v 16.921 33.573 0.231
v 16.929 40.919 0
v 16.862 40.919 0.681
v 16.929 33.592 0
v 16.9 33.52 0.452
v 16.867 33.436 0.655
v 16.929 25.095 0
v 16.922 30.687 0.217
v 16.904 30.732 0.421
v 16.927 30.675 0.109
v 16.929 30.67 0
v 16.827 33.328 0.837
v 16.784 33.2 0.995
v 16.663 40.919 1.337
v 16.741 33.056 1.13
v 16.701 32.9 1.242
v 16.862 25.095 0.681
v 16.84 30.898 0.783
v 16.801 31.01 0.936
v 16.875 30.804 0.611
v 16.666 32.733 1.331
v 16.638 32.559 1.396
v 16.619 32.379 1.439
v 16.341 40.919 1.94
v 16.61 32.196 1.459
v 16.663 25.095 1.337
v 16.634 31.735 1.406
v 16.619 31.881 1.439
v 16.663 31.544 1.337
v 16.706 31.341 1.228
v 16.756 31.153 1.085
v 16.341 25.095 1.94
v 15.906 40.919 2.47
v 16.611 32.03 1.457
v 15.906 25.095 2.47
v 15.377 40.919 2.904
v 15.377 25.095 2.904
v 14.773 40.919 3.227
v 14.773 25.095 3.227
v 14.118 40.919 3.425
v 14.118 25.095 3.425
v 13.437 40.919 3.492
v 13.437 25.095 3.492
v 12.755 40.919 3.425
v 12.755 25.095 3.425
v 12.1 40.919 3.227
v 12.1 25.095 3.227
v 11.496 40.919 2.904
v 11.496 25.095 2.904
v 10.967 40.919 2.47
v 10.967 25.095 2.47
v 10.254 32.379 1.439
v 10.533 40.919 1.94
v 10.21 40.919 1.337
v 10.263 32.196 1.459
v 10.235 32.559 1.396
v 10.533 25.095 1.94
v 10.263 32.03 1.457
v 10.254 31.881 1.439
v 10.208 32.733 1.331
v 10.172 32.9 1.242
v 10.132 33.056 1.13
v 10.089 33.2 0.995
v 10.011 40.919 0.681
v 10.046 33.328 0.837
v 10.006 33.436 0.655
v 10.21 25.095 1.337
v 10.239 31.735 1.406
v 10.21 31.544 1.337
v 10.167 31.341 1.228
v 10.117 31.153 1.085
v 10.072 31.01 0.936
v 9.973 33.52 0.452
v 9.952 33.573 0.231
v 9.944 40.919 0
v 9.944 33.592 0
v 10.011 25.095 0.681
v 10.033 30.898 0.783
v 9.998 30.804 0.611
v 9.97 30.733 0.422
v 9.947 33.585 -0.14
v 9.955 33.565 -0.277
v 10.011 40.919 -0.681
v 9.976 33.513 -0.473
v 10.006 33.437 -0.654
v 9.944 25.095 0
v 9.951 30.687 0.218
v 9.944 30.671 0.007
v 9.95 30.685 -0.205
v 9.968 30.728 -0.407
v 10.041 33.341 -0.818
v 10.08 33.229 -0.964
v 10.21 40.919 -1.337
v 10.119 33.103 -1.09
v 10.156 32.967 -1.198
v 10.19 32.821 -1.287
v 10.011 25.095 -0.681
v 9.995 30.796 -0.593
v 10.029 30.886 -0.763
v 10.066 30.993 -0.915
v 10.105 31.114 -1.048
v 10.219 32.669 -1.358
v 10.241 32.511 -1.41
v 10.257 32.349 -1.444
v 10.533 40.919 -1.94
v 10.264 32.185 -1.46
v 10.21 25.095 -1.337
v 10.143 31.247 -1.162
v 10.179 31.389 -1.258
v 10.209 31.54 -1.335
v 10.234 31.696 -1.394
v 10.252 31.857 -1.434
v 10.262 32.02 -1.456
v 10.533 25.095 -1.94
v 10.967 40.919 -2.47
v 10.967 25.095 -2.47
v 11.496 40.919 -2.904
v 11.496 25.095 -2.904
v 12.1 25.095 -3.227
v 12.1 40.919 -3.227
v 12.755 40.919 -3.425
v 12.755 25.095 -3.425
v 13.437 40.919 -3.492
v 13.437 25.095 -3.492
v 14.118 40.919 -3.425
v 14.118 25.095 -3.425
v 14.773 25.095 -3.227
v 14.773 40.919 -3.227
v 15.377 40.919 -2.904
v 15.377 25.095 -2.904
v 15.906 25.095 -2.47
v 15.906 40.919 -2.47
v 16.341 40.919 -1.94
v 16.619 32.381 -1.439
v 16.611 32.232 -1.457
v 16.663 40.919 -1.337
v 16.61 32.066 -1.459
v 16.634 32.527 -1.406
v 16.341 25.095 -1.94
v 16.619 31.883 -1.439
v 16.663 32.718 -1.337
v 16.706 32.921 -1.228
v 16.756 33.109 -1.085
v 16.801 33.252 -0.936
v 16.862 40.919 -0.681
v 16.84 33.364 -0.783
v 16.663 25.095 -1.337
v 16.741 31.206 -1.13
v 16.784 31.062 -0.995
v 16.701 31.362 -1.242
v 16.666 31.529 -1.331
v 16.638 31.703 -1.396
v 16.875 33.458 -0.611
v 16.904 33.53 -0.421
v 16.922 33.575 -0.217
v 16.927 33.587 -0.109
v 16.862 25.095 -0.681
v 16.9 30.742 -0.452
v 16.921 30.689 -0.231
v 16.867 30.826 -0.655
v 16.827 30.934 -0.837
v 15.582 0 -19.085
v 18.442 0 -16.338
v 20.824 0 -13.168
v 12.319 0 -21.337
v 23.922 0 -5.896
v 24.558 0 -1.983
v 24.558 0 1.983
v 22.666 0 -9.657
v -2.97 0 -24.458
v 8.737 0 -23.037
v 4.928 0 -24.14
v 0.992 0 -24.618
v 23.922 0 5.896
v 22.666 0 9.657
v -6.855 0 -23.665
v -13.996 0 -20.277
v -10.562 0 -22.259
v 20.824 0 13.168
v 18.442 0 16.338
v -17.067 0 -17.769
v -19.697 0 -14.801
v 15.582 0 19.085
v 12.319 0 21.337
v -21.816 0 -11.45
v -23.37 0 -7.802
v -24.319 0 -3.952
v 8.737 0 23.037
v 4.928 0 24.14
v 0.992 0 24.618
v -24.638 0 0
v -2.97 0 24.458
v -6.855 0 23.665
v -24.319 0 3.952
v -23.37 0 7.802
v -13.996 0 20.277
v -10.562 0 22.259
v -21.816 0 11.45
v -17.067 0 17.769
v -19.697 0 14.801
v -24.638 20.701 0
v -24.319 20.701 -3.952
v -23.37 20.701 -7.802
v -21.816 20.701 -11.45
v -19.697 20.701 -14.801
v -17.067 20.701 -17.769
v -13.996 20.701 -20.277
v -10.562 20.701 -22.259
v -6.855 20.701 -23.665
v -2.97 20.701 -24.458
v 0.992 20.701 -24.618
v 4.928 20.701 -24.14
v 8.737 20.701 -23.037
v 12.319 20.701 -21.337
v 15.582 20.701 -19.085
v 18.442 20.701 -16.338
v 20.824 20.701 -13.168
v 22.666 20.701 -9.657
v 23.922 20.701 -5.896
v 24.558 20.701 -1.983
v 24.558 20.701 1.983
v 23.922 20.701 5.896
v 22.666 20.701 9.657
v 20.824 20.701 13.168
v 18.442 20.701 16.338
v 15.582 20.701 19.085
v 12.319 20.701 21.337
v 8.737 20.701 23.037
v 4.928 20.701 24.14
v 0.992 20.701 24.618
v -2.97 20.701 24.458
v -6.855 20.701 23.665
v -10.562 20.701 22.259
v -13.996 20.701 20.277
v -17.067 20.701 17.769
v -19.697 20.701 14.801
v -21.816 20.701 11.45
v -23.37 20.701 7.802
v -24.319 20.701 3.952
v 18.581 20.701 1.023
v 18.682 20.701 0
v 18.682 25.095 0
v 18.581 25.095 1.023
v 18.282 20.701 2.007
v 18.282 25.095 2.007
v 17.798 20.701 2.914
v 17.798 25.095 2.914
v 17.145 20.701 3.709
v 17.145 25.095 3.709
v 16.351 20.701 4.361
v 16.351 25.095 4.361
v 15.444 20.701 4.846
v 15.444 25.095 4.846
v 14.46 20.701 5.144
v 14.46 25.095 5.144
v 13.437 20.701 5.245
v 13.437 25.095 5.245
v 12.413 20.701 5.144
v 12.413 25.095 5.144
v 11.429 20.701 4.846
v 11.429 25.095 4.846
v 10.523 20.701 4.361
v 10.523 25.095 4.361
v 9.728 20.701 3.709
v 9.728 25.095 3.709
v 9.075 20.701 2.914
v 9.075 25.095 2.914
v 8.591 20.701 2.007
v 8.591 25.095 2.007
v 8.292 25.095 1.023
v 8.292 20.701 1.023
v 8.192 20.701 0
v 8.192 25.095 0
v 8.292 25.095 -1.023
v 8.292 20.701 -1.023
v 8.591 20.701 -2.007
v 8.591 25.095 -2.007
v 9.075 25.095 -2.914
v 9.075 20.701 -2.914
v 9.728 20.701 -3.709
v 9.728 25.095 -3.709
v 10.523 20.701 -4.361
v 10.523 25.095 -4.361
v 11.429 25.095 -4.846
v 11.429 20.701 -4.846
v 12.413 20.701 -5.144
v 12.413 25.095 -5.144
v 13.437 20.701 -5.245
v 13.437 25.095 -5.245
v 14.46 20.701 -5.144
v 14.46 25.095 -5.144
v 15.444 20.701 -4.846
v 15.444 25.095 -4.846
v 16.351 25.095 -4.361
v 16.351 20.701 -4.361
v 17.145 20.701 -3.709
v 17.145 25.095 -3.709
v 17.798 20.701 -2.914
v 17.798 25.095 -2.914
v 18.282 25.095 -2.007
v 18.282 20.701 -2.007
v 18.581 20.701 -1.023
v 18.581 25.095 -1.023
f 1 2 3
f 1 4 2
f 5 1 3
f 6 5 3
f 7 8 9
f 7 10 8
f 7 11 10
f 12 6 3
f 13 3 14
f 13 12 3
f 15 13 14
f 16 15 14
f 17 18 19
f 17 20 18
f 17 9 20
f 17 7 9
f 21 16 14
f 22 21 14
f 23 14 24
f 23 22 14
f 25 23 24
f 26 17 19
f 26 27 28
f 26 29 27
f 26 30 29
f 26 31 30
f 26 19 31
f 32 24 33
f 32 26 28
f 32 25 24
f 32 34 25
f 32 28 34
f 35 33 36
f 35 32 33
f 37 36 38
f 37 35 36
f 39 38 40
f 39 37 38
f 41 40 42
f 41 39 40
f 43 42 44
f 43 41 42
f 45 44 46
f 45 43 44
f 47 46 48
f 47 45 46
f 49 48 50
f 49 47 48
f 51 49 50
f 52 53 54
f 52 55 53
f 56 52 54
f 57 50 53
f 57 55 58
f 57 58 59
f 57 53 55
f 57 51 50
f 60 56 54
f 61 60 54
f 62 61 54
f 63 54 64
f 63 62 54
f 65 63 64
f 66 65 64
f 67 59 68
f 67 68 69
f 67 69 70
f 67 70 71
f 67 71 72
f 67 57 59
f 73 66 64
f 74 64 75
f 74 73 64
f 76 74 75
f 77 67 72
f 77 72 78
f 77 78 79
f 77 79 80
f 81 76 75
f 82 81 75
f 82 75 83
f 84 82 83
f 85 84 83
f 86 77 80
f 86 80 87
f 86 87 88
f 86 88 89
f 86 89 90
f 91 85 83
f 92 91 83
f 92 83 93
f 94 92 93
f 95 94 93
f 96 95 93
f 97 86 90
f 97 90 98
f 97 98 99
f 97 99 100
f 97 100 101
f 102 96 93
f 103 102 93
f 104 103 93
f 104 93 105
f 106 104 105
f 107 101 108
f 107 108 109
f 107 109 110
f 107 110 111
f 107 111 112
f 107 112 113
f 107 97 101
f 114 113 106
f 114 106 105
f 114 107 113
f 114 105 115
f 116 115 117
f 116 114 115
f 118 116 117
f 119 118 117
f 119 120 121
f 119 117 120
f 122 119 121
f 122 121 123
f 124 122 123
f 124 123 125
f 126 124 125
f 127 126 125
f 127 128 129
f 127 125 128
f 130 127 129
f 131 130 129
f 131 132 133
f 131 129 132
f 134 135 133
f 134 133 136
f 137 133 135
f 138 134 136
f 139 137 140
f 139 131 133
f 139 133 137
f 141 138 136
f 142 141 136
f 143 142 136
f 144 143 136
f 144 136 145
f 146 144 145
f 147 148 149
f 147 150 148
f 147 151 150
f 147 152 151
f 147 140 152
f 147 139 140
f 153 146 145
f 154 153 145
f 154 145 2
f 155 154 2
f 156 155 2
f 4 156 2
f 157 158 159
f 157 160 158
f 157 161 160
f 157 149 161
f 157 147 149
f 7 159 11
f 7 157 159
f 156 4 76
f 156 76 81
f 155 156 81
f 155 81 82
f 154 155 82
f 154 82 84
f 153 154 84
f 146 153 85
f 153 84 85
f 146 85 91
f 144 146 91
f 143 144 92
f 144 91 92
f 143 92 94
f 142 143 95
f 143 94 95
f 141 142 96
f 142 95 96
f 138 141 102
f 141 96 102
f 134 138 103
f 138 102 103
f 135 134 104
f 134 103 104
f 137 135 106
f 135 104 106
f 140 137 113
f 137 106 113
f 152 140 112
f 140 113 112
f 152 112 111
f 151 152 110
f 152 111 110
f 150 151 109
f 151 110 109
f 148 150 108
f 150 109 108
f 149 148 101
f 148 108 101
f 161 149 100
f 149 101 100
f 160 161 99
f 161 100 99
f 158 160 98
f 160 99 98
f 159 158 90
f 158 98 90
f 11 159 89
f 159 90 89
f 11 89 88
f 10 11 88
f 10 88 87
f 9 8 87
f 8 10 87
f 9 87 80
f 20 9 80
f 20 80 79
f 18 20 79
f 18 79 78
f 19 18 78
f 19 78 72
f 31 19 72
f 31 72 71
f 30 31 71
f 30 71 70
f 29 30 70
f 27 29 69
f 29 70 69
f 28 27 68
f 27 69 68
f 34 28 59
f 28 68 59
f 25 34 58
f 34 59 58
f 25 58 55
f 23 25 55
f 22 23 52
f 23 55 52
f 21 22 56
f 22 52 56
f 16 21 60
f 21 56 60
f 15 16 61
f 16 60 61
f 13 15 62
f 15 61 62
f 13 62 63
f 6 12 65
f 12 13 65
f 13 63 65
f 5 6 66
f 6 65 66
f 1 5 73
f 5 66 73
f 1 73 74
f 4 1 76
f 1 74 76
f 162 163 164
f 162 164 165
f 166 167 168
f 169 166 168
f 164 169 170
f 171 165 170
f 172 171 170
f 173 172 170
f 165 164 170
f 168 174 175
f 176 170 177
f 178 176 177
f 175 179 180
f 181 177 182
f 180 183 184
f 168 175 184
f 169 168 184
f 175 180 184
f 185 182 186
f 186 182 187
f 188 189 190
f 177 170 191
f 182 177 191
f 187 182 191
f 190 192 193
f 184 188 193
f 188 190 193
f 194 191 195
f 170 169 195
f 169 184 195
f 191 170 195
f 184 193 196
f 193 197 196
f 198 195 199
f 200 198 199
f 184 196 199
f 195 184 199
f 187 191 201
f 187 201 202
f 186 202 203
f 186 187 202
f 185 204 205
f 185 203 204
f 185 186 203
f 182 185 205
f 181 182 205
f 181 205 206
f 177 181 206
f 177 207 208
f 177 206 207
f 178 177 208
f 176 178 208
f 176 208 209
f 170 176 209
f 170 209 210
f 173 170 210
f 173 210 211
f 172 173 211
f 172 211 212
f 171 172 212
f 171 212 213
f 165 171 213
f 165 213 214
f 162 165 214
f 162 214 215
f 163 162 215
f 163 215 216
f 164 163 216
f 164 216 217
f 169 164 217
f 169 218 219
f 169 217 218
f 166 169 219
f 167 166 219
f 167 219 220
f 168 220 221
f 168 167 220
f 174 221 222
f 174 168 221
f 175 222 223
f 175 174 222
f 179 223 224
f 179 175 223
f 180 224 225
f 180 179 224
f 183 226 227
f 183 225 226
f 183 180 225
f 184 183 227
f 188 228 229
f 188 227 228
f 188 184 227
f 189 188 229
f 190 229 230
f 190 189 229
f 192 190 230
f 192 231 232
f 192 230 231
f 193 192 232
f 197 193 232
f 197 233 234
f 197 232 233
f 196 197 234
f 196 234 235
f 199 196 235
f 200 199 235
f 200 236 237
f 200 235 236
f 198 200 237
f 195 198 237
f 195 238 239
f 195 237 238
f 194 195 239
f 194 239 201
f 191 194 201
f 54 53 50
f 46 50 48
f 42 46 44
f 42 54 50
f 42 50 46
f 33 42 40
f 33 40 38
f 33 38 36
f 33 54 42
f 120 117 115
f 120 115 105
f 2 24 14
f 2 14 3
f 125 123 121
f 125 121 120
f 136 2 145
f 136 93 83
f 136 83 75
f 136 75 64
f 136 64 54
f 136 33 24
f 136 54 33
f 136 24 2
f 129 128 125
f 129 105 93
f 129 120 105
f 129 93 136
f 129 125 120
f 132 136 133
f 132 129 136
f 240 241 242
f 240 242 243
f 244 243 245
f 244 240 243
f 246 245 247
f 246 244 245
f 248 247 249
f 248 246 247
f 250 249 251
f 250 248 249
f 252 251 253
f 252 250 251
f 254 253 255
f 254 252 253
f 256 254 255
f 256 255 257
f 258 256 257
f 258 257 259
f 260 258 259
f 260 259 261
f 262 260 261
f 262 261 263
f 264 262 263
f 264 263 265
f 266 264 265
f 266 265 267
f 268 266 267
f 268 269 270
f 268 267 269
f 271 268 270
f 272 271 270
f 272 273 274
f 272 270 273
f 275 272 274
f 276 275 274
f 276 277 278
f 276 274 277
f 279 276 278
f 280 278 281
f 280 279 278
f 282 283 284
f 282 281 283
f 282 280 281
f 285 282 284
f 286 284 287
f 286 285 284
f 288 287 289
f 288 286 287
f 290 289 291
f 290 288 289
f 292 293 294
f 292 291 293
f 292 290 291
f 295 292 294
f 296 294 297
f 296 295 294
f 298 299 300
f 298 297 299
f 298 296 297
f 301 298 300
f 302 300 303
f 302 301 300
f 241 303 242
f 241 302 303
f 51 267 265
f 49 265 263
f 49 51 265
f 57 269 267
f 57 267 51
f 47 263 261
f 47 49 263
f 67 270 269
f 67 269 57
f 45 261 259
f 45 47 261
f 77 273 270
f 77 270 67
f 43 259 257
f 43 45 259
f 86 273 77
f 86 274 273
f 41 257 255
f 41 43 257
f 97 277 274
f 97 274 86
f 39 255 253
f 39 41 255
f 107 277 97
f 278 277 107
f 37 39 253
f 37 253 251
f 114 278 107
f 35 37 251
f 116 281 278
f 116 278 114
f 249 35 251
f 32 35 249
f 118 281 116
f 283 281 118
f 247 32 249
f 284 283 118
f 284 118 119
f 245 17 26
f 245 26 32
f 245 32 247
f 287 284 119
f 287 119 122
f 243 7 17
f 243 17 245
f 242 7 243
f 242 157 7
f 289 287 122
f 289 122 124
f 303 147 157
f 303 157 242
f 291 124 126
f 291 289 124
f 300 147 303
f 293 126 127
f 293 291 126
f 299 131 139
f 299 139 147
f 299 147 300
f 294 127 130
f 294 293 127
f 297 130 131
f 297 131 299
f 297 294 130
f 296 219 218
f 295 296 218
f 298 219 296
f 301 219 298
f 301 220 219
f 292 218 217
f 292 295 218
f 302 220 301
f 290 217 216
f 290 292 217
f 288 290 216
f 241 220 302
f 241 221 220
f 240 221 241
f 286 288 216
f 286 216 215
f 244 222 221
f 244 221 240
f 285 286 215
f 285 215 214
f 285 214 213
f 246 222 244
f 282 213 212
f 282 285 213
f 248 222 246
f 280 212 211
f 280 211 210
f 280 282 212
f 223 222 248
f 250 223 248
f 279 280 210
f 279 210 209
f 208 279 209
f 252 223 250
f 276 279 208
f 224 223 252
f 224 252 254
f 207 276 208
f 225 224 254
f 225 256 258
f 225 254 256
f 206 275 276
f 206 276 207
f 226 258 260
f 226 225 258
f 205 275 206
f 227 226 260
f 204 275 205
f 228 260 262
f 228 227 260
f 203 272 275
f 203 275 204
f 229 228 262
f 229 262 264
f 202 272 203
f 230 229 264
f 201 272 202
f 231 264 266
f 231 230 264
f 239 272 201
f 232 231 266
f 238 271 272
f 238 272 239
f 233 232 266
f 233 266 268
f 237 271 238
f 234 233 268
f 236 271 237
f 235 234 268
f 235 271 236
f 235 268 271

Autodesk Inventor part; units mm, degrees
ref_plane "YZ Plane" through (0, 0, 0) normal (1, 0, 0) x (0, 1, 0)
ref_plane "XZ Plane" through (0, 0, 0) normal (0, 1, 0) x (-1, 0, 0)
ref_plane "XY Plane" through (0, 0, 0) normal (0, 0, 1) x (1, 0, 0)
sketch "Sketch1" plane through (0, 0, 0) normal (0, 1, 0) x (-1, 0, 0)
  circle A0 centre (0, 0) radius 24.638
  dimension "d0" = 49.276
extrude "Extrusion1" add sketch "Sketch1" along normal blind 20.701
sketch "Sketch2" plane through (0, 20.701, 0) normal (0, 1, 0) x (1, 0, 0)
  circle A0 centre (13.4366, 0) radius 3.4925
  point P0 (0, 0)
  dimension "d3" = 6.985
  dimension "d4" = 13.4366
extrude "Extrusion2" add sketch "Sketch2" along normal blind 20.2184
sketch "Sketch3" plane through (0, 20.701, 0) normal (0, 1, 0) x (1, 0, 0)
  circle A0 centre (13.4366, 0) radius 3.4925 projected
  circle A1 centre (13.4366, 0) radius 5.2451
  point P0 (0, 0)
  dimension "d7" = 10.4902
extrude "Extrusion3" add sketch "Sketch3" along normal blind 4.3942 contours A0 | A1
sketch "Sketch4" plane through (0, 0, 0) normal (1, 0, 0) x (0, 1, 0)
  circle A0 centre (32.131, 0) radius 1.4605
  line L0 (20.701, -24.638) -> (20.701, 24.638) projected
  point P0 (0, 0)
  dimension "d10" = 2.921
  dimension "d11" = 11.43
extrude "Extrusion4" cut sketch "Sketch4" along normal through all
properties part number "24W_motor"
